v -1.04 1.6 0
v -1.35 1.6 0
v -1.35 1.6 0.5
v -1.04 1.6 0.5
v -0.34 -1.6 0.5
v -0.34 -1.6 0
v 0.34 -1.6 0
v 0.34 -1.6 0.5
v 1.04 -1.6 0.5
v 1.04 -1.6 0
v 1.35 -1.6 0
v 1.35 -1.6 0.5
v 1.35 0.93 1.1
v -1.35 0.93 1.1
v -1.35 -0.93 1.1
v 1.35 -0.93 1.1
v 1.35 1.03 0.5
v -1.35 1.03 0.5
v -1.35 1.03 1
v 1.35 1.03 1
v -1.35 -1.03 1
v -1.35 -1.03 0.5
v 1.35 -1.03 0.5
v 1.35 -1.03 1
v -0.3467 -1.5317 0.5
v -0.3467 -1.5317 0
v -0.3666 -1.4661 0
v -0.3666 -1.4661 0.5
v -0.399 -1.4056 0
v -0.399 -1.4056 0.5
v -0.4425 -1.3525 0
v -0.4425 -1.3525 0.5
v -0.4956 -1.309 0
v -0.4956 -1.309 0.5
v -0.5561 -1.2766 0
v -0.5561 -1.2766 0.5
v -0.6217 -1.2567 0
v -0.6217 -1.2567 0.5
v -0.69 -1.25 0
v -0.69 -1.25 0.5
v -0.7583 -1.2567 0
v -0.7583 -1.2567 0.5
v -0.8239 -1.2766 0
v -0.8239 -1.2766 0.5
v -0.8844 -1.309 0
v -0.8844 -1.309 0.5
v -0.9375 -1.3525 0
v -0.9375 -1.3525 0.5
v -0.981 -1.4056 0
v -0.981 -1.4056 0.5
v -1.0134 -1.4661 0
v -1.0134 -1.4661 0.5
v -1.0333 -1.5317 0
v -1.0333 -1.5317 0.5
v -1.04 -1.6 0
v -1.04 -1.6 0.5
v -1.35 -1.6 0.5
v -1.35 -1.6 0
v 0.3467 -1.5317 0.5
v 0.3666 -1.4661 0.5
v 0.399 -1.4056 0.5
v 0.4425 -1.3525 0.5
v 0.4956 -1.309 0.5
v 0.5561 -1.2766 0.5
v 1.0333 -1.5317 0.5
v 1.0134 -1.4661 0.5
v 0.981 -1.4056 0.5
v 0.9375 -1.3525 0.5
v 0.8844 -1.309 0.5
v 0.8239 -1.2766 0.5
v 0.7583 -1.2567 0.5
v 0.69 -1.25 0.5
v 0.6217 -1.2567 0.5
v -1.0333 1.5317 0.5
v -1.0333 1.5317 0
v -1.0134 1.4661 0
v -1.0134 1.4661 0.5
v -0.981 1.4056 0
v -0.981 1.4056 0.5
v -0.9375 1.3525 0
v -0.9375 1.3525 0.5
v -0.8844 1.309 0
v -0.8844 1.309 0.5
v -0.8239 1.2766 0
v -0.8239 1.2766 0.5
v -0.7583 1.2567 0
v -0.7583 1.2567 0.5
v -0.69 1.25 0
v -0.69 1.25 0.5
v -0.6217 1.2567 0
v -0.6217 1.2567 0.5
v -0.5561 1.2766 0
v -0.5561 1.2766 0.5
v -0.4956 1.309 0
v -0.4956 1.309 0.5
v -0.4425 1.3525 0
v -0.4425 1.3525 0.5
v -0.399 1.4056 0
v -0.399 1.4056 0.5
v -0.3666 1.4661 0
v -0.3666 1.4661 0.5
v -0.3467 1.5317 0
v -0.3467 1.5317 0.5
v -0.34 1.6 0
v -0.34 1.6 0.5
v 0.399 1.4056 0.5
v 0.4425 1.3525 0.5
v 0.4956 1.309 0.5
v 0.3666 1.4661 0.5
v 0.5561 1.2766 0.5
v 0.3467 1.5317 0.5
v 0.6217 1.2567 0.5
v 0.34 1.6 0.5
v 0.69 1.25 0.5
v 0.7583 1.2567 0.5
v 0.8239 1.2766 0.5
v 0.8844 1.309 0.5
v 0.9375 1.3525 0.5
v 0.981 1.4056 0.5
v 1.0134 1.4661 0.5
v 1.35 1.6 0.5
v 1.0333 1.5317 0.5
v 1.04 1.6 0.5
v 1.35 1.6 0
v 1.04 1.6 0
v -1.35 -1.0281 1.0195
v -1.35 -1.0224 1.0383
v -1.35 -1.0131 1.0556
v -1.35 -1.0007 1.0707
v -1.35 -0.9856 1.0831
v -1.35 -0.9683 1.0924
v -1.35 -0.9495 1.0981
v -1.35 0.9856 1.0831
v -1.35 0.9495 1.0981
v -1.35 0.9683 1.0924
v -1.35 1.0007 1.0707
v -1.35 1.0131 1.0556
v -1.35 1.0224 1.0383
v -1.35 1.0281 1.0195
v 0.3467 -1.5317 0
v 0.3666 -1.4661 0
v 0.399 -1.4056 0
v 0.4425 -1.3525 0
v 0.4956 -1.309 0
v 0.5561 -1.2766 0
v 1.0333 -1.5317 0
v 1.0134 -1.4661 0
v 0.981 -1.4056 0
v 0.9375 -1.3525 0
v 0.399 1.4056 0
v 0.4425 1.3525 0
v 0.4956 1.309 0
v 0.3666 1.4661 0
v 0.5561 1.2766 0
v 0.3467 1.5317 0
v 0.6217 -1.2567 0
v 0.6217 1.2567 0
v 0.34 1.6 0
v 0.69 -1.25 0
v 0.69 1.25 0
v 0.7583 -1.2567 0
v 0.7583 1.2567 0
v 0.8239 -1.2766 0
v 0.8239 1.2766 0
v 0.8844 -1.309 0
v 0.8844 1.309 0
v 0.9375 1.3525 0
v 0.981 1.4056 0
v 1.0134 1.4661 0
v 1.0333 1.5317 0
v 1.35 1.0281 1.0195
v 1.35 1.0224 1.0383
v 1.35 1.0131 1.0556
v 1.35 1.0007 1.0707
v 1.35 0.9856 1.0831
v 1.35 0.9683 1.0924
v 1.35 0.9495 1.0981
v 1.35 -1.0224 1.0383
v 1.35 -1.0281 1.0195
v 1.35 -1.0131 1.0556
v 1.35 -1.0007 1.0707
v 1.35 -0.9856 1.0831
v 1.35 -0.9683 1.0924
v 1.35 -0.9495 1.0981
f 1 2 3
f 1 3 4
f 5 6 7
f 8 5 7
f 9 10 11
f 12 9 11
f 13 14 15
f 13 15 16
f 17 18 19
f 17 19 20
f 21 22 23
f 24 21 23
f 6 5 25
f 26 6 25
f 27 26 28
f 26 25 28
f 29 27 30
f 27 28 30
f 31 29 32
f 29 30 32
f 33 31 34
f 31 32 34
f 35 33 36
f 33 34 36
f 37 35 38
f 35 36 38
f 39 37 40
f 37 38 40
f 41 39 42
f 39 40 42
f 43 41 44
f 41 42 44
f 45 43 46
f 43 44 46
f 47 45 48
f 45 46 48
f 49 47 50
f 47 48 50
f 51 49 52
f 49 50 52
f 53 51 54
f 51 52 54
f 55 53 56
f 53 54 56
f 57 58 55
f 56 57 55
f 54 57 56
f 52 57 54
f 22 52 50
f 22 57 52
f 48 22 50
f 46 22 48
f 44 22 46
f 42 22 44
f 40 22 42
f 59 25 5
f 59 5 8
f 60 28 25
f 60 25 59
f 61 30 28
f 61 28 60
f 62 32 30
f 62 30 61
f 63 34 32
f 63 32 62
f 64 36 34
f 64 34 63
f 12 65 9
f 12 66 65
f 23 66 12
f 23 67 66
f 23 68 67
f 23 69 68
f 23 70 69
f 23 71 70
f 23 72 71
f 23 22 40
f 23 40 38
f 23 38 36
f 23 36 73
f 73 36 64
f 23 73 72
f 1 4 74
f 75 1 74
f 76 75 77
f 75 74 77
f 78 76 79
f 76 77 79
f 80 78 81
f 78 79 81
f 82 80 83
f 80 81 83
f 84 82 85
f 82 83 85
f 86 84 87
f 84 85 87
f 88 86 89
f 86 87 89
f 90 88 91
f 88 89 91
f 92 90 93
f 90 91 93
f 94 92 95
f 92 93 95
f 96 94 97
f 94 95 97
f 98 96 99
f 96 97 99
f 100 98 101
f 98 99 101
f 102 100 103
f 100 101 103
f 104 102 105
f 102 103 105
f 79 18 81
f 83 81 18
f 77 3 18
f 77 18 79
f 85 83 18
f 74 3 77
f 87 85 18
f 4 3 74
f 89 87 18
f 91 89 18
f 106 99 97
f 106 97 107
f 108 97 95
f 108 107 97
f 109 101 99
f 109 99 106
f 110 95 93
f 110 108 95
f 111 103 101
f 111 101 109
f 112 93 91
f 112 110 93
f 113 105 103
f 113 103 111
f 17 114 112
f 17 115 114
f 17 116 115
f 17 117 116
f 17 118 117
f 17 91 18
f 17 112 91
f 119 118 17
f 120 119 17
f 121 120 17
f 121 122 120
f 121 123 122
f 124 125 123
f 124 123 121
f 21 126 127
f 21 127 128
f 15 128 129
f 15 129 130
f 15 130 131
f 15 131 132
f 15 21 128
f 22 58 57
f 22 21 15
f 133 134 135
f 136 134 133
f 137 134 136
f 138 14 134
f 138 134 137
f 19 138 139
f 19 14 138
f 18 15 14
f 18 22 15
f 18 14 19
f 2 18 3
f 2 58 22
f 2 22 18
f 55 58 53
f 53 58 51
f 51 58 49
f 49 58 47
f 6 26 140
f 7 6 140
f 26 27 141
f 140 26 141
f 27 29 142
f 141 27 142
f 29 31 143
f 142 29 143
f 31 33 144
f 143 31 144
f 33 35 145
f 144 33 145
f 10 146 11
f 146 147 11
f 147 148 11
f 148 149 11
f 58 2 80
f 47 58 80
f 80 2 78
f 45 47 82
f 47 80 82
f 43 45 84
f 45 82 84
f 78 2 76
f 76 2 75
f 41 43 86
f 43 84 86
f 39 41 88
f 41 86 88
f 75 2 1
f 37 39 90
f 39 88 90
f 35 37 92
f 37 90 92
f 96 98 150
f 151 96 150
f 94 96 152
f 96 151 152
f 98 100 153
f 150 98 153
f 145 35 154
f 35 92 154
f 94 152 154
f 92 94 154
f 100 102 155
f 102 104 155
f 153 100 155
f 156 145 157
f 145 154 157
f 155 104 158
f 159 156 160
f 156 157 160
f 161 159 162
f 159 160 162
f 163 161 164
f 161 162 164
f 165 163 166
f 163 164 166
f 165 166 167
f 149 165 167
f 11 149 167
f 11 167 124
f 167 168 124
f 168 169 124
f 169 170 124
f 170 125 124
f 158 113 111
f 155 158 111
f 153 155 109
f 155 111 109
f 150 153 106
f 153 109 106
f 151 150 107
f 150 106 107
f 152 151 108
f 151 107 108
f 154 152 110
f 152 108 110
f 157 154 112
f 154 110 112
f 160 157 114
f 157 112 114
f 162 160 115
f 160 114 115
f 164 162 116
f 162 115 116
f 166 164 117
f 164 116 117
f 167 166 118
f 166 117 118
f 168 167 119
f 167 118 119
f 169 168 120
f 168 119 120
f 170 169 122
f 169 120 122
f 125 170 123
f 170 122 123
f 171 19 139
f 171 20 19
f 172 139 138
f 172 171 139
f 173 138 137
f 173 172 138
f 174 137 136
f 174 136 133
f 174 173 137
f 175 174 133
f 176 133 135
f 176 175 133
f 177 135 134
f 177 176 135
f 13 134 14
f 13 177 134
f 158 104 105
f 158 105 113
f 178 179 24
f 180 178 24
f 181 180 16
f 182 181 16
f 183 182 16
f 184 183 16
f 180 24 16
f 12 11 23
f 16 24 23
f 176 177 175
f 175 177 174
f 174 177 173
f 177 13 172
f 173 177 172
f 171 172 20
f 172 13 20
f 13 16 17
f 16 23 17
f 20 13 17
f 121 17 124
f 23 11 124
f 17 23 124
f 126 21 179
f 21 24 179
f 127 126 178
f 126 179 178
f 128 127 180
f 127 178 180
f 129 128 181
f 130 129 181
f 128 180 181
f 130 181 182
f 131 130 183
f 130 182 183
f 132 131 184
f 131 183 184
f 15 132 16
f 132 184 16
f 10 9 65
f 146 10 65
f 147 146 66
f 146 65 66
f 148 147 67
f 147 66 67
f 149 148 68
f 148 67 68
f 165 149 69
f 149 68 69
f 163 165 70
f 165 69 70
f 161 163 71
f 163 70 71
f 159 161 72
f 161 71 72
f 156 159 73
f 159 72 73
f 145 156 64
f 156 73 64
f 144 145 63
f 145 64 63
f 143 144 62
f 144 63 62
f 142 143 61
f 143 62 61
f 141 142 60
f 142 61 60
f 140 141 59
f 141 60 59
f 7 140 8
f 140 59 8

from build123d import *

# Parameters (mm, degrees)
F0_W     = 2.7
F0_H     = 3.2
F1_DEPTH = 0.5
F3_DEPTH = 0.501
F4_W     = 2.7
F4_H     = 2.06
F5_DEPTH = 0.6
F6_R     = 0.1


with BuildPart() as f1:
    # F0 (on Top) → F1 (new body)
    with BuildSketch(Plane.XY):
        Rectangle(F0_W, F0_H)
    extrude(amount=F1_DEPTH)

    # F2 (on face) → F3 (cut, through all)
    with BuildSketch(Plane.XY.offset(0.5)):
        with BuildLine():
            Line((-0.34, 1.6), (-1.04, 1.6))
            ThreePointArc((-1.04, 1.6), (-0.69, 1.25), (-0.34, 1.6))
        make_face()
        with BuildLine():
            Line((1.04, 1.6), (0.34, 1.6))
            ThreePointArc((0.34, 1.6), (0.69, 1.25), (1.04, 1.6))
        make_face()
        with BuildLine():
            ThreePointArc((1.04, -1.6), (0.69, -1.25), (0.34, -1.6))
            Line((0.34, -1.6), (1.04, -1.6))
        make_face()
        with BuildLine():
            ThreePointArc((-0.34, -1.6), (-0.69, -1.25), (-1.04, -1.6))
            Line((-1.04, -1.6), (-0.34, -1.6))
        make_face()
    extrude(amount=-F3_DEPTH, mode=Mode.SUBTRACT)

    # F4 (on face) → F5 (join)
    with BuildSketch(Plane.XY.offset(0.5)):
        Rectangle(F4_W, F4_H)
    extrude(amount=F5_DEPTH)

    # F6
    f6_edges = [f1.edges().sort_by_distance(p)[0] for p in [
        (0, 1.03, 1.1),
        (0, -1.03, 1.1),
    ]]
    fillet(f6_edges, radius=F6_R)


solid = f1.part
